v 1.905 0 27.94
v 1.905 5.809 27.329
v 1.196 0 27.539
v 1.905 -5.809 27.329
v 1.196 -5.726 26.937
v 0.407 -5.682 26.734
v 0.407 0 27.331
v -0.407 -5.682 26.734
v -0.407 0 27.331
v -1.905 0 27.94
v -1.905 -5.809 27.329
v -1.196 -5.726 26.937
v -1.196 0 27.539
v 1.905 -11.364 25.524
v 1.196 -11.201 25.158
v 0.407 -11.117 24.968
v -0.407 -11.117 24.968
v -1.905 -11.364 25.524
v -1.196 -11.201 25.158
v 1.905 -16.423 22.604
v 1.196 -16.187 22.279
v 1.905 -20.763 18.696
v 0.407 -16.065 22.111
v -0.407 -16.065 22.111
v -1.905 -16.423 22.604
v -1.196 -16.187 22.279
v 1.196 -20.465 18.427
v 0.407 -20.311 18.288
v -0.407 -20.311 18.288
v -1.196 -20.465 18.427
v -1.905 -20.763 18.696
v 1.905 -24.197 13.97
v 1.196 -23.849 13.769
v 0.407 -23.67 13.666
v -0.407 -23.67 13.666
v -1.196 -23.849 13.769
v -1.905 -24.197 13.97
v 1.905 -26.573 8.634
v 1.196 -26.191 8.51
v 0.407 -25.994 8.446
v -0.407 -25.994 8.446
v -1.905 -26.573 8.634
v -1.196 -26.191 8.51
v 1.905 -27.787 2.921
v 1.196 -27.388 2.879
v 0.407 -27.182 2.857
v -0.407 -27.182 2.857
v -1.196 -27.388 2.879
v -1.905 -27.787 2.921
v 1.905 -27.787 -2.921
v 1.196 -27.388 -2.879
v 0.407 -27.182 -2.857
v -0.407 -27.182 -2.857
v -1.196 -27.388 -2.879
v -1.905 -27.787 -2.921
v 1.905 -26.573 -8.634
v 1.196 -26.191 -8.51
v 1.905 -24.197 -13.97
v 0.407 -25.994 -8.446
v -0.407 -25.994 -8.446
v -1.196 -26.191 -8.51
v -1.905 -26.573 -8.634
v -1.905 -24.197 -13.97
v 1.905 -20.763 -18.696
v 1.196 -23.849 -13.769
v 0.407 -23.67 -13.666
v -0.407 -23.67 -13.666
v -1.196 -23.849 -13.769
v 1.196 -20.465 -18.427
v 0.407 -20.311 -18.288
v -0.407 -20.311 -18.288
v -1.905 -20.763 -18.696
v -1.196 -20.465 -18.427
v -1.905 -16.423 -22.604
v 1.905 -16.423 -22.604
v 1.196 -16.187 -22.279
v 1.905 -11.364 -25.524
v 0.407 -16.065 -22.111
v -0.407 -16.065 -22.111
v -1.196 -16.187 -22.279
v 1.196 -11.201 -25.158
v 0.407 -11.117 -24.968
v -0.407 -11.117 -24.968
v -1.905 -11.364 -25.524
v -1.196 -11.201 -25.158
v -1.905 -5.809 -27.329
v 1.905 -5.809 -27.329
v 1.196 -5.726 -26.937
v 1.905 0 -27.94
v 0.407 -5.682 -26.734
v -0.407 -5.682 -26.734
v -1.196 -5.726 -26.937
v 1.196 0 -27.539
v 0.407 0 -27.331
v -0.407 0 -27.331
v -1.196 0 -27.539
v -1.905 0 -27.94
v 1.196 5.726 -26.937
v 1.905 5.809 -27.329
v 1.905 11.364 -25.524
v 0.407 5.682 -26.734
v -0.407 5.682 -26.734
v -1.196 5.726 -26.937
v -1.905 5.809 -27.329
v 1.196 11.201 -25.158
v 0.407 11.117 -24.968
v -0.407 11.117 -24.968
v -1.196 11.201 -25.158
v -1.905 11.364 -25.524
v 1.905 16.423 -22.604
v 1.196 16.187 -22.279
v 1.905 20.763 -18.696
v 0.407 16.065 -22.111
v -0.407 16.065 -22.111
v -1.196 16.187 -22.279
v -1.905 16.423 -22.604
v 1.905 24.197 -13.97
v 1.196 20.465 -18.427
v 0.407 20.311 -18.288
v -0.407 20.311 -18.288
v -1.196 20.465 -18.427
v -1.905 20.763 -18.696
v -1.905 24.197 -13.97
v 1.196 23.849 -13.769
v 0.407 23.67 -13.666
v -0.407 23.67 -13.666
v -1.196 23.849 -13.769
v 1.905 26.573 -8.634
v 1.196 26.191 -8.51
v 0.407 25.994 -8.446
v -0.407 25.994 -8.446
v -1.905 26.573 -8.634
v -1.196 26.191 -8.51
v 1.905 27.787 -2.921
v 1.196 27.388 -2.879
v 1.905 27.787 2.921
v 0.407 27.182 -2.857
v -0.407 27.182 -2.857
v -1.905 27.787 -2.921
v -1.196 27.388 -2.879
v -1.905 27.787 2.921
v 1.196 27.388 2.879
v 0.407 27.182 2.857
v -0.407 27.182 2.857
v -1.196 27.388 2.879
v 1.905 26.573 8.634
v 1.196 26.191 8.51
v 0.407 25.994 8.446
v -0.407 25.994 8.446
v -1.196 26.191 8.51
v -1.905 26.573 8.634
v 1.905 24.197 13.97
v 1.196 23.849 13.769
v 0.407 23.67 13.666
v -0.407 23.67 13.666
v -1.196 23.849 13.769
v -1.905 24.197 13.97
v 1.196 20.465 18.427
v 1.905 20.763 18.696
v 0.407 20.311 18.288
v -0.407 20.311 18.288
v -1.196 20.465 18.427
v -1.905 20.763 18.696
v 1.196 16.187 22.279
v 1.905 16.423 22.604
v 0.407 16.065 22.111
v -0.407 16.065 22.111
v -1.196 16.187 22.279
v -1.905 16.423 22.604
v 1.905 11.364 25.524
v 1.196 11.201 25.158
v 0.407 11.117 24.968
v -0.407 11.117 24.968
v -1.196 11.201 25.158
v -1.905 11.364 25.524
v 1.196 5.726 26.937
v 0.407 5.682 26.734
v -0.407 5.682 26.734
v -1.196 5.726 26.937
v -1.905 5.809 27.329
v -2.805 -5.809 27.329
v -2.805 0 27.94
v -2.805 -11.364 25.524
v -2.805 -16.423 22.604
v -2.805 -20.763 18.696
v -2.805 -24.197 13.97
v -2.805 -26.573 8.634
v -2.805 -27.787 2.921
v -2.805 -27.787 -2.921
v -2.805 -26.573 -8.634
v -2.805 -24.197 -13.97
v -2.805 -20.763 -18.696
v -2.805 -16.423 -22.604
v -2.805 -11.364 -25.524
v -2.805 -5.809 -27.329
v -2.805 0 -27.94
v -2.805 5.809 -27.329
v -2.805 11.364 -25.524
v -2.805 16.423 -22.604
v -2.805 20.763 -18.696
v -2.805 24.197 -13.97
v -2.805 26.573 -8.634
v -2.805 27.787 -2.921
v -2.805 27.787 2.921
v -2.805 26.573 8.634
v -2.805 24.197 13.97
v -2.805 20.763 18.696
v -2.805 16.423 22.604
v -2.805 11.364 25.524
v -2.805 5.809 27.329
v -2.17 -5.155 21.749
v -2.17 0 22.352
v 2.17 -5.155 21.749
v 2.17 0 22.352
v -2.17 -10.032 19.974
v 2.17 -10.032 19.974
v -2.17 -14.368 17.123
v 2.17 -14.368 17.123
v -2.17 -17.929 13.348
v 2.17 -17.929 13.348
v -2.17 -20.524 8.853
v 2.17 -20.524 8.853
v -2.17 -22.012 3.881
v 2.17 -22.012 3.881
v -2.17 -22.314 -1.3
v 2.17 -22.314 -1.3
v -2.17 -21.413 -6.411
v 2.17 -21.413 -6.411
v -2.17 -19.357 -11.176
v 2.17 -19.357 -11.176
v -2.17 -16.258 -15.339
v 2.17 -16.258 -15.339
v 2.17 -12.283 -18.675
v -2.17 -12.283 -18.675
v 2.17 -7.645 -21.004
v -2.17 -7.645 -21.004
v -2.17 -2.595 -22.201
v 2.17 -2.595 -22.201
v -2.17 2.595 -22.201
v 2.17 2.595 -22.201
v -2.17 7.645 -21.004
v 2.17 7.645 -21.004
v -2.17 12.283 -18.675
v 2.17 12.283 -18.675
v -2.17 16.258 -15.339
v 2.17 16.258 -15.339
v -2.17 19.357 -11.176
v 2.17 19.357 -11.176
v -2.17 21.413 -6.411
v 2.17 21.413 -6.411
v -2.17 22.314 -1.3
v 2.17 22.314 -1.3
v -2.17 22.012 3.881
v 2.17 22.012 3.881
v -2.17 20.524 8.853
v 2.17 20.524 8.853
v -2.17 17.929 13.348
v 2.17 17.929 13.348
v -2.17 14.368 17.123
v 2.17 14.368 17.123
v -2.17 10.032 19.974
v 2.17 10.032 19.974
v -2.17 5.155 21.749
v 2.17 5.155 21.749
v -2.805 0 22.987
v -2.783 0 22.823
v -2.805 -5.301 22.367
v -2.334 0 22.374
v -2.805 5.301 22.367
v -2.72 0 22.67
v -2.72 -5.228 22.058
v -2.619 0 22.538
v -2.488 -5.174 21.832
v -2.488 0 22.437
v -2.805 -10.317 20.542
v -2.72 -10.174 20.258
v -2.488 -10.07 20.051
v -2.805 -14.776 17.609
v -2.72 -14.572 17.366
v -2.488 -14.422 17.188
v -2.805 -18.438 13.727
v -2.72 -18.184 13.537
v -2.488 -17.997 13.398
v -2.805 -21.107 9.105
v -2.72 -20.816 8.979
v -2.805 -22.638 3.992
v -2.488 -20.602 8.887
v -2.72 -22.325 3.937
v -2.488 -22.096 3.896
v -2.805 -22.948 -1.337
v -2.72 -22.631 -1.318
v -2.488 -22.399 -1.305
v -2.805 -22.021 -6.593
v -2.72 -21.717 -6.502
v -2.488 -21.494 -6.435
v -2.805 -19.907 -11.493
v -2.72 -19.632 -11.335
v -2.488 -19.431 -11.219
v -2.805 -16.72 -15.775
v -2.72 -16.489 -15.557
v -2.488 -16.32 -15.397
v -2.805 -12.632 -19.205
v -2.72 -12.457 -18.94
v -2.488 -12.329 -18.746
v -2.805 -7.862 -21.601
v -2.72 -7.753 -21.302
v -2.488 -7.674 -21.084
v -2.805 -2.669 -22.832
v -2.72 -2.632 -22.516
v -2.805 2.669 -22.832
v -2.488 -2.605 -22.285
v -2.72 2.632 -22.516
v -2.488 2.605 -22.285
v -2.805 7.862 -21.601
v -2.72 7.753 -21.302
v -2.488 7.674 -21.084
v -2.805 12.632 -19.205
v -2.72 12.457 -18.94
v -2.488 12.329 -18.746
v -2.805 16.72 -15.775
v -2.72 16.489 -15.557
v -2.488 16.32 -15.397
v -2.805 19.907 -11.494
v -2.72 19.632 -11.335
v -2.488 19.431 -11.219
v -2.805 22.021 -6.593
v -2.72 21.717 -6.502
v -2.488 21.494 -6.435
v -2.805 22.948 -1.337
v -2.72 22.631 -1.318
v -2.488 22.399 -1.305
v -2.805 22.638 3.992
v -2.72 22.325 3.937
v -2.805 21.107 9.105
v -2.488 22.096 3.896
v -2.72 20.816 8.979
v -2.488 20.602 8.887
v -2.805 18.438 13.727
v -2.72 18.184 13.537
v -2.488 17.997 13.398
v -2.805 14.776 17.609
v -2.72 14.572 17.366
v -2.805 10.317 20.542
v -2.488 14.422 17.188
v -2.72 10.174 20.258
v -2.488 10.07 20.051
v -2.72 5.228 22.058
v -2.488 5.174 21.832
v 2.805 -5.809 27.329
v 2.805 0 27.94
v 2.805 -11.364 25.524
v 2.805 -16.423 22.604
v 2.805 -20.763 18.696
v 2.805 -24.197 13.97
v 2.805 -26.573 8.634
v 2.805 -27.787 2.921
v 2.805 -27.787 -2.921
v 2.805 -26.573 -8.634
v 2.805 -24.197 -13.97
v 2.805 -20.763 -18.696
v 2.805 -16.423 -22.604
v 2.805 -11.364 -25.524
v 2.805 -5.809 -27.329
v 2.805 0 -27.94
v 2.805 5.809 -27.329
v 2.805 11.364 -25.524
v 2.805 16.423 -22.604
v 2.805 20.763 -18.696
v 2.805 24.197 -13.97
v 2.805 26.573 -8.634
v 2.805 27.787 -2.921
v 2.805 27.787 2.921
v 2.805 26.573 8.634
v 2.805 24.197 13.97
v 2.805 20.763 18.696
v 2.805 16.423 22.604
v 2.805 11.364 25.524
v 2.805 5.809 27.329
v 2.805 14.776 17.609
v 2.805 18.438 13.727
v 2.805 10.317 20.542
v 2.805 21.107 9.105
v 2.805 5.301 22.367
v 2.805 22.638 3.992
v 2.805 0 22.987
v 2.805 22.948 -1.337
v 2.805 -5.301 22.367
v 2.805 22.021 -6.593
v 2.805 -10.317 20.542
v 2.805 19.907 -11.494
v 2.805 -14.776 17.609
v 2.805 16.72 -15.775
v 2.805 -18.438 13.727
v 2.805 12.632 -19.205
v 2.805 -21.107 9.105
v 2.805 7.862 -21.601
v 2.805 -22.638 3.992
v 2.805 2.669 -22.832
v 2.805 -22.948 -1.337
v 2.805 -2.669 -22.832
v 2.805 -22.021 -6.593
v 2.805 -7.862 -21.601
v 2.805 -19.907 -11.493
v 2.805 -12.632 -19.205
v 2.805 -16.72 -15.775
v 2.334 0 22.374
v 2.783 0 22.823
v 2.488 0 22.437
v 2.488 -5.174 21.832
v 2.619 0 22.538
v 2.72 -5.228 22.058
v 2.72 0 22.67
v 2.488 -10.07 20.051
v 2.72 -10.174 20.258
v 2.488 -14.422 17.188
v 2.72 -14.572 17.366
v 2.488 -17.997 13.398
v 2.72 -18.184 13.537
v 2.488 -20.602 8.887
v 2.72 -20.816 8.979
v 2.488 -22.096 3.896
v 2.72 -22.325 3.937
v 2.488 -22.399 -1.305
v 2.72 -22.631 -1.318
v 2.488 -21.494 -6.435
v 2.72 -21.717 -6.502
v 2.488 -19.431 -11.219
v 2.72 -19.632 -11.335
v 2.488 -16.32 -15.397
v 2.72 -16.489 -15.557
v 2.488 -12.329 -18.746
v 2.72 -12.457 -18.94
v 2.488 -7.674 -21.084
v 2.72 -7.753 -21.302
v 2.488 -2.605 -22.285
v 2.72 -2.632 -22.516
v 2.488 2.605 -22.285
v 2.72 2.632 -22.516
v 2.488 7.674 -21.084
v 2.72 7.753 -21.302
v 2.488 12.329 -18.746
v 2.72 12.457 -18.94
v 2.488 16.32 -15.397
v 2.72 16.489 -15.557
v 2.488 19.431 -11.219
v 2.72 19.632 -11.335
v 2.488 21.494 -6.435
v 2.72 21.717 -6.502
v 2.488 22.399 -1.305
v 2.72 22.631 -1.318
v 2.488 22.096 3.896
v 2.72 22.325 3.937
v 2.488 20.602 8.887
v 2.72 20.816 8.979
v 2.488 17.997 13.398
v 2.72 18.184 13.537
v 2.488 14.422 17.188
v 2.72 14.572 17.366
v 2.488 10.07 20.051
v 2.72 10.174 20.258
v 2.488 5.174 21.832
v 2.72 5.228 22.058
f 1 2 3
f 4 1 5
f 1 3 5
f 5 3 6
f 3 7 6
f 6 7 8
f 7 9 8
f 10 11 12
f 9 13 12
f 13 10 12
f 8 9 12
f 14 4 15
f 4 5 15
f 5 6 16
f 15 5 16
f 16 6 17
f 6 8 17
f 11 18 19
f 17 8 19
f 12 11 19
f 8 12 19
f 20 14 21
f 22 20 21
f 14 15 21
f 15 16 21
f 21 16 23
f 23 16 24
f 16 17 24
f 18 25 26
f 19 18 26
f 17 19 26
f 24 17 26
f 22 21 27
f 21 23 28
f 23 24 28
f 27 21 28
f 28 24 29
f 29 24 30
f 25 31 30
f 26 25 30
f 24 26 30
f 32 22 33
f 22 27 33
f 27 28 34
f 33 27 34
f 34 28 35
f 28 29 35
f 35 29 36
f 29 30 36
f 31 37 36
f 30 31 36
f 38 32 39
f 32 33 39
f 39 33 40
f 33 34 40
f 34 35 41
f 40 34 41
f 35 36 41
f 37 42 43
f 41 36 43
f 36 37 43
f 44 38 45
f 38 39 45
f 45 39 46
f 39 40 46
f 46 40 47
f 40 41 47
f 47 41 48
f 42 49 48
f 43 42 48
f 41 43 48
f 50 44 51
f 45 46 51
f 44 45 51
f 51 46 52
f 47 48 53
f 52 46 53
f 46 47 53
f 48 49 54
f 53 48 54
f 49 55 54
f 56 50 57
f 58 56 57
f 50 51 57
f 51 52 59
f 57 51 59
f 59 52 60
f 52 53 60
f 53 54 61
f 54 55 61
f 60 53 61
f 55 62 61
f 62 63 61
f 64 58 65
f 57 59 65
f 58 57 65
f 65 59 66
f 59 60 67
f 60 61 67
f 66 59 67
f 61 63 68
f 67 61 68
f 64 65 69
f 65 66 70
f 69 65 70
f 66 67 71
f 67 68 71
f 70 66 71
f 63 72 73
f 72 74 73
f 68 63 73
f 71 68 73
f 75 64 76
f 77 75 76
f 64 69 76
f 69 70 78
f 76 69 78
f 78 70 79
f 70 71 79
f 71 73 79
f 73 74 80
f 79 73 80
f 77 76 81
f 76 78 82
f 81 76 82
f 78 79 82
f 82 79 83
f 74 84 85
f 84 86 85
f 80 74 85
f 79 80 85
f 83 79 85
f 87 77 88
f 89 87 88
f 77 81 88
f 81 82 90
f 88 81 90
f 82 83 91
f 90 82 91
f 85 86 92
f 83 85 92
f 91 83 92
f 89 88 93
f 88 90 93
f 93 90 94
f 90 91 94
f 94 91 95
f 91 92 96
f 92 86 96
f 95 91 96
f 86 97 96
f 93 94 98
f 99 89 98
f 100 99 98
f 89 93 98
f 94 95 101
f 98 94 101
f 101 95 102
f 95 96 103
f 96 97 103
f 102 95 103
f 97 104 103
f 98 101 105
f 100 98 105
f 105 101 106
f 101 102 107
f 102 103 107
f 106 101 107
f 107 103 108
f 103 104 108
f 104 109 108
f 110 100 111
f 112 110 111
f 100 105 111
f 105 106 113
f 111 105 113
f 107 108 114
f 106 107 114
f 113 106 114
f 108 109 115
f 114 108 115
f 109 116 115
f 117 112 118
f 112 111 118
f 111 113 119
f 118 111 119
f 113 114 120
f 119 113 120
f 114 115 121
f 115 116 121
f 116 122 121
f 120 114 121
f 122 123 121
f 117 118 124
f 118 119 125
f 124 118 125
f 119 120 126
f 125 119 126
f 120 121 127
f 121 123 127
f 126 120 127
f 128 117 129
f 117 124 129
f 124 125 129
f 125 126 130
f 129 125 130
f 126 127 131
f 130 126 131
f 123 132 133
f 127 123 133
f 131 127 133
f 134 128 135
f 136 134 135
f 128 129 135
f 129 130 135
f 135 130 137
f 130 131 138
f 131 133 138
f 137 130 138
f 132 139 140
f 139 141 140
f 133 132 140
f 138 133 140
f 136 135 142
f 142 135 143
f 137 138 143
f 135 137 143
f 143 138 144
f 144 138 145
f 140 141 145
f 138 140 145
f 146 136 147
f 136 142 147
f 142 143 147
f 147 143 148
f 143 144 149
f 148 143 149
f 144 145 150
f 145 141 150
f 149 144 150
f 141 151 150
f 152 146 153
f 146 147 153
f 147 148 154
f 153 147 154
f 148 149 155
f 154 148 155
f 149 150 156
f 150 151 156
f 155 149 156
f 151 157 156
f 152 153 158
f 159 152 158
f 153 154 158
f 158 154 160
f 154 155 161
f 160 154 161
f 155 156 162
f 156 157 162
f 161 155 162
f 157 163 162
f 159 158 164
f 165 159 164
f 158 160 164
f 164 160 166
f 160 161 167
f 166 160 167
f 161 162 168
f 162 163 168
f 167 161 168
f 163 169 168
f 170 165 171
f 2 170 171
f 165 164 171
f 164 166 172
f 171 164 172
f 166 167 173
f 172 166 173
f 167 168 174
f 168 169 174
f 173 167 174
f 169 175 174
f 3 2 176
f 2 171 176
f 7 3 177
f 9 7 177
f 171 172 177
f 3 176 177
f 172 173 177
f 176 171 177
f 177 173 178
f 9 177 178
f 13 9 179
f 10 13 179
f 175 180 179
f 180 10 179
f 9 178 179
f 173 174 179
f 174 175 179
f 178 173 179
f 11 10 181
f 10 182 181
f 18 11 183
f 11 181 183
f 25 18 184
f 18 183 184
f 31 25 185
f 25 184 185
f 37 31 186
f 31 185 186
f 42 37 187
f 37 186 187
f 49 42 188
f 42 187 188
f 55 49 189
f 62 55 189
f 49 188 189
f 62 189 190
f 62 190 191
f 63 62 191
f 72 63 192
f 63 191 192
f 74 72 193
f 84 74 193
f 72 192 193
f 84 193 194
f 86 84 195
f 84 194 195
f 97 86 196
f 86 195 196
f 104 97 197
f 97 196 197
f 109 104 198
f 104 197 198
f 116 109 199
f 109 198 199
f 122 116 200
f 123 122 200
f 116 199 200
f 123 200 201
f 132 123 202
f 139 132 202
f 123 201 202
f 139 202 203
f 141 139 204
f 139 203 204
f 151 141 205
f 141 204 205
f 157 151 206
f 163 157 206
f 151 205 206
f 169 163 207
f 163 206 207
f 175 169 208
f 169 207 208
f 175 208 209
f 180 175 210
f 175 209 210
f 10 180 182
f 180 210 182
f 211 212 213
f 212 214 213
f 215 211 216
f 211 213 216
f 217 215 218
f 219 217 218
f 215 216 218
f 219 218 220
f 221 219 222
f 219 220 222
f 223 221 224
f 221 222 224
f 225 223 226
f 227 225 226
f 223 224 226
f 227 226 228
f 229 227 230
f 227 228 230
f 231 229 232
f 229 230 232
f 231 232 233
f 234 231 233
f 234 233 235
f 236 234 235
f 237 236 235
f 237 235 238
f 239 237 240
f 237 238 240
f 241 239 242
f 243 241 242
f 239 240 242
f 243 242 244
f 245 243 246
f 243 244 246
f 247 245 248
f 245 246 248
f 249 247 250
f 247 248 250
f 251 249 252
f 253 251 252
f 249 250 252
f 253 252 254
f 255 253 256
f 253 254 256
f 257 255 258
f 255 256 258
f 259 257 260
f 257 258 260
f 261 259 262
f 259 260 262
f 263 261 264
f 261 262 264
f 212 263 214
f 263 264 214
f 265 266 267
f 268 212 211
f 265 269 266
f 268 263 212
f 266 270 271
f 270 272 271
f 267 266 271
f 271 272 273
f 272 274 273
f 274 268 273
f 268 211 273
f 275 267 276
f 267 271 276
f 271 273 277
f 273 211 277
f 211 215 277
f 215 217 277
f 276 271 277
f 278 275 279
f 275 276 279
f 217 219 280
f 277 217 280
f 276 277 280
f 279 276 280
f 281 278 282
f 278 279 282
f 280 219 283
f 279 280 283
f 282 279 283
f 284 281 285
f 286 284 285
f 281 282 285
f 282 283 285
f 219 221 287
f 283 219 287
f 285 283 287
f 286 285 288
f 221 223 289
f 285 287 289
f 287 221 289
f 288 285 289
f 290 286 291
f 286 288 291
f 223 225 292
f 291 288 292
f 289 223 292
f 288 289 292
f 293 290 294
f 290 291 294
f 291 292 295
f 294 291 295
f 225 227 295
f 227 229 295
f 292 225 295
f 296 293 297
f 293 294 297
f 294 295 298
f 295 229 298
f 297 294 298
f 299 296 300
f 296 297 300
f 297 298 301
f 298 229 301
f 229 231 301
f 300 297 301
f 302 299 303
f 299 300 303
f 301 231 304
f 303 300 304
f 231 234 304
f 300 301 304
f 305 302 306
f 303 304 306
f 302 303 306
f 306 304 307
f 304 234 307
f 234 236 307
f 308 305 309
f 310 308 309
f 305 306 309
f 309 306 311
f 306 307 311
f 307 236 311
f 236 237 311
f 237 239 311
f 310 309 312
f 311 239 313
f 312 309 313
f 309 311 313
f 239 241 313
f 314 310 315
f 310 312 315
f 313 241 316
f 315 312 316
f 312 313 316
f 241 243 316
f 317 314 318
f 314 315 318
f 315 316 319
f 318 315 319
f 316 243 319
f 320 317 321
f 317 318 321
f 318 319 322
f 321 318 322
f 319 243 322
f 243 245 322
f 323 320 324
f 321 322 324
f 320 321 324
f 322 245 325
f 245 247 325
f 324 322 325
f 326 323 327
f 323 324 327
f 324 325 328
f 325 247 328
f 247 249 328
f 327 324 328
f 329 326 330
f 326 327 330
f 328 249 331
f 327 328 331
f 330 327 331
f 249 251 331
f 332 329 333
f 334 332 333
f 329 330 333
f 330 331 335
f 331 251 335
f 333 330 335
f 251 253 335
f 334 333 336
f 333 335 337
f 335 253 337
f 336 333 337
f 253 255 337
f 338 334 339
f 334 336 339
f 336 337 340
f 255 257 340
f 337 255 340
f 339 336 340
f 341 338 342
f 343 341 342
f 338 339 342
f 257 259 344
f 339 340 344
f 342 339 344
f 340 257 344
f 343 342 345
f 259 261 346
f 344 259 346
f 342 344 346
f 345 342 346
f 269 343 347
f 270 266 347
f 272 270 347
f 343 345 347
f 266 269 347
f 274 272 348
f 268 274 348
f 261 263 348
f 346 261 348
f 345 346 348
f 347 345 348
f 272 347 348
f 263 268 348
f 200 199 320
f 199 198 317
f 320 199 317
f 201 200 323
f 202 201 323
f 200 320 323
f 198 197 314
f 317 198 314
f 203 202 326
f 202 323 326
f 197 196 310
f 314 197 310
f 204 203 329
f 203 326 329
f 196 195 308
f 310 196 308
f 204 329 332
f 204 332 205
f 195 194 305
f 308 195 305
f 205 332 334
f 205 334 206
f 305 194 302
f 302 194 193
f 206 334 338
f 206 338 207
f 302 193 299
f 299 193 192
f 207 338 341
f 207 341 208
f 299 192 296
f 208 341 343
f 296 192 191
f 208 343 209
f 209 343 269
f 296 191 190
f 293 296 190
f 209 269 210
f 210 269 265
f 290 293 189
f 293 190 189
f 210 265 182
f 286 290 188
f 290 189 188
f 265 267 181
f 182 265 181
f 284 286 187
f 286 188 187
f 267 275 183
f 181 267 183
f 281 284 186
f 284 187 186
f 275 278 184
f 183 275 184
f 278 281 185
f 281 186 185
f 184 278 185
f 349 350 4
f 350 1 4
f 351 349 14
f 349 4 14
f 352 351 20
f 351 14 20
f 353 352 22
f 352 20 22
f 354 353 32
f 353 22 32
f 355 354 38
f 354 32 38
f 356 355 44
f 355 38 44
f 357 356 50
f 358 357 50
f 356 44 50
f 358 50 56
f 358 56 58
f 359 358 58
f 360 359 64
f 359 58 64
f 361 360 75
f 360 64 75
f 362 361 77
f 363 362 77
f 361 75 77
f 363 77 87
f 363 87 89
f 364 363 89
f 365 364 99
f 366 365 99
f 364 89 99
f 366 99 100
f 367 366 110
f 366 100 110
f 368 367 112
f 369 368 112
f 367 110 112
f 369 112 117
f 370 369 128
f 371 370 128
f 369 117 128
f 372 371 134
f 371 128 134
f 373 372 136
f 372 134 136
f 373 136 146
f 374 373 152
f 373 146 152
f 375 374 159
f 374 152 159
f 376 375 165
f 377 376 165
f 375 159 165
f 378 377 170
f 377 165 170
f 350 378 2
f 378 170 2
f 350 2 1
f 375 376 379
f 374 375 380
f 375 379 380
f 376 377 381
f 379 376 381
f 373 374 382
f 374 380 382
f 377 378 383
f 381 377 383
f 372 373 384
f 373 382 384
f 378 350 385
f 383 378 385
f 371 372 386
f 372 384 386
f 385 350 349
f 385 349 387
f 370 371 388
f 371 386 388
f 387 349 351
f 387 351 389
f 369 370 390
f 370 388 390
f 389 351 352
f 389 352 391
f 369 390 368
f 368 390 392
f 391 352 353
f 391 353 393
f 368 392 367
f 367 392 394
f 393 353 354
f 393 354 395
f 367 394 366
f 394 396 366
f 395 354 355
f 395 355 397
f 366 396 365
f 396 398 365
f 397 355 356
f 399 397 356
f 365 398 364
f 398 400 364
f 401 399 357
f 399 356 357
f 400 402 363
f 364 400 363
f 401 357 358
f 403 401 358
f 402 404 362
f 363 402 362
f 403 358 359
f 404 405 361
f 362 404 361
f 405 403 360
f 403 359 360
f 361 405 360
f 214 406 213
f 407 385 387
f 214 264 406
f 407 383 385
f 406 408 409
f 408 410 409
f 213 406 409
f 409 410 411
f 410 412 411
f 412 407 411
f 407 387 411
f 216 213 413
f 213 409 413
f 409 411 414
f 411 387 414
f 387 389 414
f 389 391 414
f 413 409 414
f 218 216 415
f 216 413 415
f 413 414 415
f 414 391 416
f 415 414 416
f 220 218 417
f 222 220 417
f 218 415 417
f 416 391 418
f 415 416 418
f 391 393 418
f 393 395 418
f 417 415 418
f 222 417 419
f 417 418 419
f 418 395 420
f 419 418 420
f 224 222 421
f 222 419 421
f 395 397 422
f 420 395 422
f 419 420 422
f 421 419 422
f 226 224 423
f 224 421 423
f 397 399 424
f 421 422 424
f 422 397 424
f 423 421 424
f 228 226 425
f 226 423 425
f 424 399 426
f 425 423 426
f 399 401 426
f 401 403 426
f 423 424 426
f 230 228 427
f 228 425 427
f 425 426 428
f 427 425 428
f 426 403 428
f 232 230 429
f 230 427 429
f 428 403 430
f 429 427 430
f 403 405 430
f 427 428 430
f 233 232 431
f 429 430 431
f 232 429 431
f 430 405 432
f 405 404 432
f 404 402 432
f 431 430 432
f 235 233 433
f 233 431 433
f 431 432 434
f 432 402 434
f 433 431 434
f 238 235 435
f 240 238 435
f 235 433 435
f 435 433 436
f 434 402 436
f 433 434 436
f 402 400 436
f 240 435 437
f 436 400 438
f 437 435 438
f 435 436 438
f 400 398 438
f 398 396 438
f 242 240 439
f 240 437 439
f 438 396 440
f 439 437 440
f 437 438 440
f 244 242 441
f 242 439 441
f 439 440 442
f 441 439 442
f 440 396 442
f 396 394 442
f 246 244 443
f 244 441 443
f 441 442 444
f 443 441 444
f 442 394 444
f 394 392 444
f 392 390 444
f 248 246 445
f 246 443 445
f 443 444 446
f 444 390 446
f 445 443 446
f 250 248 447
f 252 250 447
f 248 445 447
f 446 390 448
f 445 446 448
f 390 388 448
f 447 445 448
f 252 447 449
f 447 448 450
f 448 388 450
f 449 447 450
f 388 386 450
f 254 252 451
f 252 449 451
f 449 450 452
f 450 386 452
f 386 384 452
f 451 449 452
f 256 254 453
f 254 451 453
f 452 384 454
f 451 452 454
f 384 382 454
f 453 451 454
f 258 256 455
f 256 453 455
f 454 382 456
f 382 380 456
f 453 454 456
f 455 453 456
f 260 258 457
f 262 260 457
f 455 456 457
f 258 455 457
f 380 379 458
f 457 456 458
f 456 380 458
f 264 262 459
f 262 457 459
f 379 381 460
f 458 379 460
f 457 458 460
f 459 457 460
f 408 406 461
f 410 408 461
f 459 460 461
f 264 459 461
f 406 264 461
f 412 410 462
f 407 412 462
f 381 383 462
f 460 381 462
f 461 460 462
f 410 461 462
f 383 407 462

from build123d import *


with BuildPart() as part:
    # Sketch1 → Revolve1 (revolve)
    with BuildSketch(Plane.XY, mode=Mode.PRIVATE) as revolve1_sk:
        with BuildLine():
            Line((2.805064434, 27.94), (1.905, 27.94))
            ThreePointArc((1.905, 27.94), (0, 27.305), (-1.905, 27.94))
            Line((-1.905, 27.94), (-2.805064434, 27.94))
            Line((-2.805064434, 27.94), (-2.805064434, 22.987))
            ThreePointArc((-2.805064434, 22.987), (-2.61907724, 22.537987194), (-2.170064434, 22.352))
            Line((-2.170064434, 22.352), (2.170064434, 22.352))
            ThreePointArc((2.170064434, 22.352), (2.61907724, 22.537987194), (2.805064434, 22.987))
            Line((2.805064434, 22.987), (2.805064434, 27.94))
        make_face()
    revolve(revolve1_sk.sketch.rotate(Axis((-23.195066381, 0, 0), (1, 0, 0)), 90), axis=Axis((-23.195066381, 0, 0), (1, 0, 0)))


solid = part.part
